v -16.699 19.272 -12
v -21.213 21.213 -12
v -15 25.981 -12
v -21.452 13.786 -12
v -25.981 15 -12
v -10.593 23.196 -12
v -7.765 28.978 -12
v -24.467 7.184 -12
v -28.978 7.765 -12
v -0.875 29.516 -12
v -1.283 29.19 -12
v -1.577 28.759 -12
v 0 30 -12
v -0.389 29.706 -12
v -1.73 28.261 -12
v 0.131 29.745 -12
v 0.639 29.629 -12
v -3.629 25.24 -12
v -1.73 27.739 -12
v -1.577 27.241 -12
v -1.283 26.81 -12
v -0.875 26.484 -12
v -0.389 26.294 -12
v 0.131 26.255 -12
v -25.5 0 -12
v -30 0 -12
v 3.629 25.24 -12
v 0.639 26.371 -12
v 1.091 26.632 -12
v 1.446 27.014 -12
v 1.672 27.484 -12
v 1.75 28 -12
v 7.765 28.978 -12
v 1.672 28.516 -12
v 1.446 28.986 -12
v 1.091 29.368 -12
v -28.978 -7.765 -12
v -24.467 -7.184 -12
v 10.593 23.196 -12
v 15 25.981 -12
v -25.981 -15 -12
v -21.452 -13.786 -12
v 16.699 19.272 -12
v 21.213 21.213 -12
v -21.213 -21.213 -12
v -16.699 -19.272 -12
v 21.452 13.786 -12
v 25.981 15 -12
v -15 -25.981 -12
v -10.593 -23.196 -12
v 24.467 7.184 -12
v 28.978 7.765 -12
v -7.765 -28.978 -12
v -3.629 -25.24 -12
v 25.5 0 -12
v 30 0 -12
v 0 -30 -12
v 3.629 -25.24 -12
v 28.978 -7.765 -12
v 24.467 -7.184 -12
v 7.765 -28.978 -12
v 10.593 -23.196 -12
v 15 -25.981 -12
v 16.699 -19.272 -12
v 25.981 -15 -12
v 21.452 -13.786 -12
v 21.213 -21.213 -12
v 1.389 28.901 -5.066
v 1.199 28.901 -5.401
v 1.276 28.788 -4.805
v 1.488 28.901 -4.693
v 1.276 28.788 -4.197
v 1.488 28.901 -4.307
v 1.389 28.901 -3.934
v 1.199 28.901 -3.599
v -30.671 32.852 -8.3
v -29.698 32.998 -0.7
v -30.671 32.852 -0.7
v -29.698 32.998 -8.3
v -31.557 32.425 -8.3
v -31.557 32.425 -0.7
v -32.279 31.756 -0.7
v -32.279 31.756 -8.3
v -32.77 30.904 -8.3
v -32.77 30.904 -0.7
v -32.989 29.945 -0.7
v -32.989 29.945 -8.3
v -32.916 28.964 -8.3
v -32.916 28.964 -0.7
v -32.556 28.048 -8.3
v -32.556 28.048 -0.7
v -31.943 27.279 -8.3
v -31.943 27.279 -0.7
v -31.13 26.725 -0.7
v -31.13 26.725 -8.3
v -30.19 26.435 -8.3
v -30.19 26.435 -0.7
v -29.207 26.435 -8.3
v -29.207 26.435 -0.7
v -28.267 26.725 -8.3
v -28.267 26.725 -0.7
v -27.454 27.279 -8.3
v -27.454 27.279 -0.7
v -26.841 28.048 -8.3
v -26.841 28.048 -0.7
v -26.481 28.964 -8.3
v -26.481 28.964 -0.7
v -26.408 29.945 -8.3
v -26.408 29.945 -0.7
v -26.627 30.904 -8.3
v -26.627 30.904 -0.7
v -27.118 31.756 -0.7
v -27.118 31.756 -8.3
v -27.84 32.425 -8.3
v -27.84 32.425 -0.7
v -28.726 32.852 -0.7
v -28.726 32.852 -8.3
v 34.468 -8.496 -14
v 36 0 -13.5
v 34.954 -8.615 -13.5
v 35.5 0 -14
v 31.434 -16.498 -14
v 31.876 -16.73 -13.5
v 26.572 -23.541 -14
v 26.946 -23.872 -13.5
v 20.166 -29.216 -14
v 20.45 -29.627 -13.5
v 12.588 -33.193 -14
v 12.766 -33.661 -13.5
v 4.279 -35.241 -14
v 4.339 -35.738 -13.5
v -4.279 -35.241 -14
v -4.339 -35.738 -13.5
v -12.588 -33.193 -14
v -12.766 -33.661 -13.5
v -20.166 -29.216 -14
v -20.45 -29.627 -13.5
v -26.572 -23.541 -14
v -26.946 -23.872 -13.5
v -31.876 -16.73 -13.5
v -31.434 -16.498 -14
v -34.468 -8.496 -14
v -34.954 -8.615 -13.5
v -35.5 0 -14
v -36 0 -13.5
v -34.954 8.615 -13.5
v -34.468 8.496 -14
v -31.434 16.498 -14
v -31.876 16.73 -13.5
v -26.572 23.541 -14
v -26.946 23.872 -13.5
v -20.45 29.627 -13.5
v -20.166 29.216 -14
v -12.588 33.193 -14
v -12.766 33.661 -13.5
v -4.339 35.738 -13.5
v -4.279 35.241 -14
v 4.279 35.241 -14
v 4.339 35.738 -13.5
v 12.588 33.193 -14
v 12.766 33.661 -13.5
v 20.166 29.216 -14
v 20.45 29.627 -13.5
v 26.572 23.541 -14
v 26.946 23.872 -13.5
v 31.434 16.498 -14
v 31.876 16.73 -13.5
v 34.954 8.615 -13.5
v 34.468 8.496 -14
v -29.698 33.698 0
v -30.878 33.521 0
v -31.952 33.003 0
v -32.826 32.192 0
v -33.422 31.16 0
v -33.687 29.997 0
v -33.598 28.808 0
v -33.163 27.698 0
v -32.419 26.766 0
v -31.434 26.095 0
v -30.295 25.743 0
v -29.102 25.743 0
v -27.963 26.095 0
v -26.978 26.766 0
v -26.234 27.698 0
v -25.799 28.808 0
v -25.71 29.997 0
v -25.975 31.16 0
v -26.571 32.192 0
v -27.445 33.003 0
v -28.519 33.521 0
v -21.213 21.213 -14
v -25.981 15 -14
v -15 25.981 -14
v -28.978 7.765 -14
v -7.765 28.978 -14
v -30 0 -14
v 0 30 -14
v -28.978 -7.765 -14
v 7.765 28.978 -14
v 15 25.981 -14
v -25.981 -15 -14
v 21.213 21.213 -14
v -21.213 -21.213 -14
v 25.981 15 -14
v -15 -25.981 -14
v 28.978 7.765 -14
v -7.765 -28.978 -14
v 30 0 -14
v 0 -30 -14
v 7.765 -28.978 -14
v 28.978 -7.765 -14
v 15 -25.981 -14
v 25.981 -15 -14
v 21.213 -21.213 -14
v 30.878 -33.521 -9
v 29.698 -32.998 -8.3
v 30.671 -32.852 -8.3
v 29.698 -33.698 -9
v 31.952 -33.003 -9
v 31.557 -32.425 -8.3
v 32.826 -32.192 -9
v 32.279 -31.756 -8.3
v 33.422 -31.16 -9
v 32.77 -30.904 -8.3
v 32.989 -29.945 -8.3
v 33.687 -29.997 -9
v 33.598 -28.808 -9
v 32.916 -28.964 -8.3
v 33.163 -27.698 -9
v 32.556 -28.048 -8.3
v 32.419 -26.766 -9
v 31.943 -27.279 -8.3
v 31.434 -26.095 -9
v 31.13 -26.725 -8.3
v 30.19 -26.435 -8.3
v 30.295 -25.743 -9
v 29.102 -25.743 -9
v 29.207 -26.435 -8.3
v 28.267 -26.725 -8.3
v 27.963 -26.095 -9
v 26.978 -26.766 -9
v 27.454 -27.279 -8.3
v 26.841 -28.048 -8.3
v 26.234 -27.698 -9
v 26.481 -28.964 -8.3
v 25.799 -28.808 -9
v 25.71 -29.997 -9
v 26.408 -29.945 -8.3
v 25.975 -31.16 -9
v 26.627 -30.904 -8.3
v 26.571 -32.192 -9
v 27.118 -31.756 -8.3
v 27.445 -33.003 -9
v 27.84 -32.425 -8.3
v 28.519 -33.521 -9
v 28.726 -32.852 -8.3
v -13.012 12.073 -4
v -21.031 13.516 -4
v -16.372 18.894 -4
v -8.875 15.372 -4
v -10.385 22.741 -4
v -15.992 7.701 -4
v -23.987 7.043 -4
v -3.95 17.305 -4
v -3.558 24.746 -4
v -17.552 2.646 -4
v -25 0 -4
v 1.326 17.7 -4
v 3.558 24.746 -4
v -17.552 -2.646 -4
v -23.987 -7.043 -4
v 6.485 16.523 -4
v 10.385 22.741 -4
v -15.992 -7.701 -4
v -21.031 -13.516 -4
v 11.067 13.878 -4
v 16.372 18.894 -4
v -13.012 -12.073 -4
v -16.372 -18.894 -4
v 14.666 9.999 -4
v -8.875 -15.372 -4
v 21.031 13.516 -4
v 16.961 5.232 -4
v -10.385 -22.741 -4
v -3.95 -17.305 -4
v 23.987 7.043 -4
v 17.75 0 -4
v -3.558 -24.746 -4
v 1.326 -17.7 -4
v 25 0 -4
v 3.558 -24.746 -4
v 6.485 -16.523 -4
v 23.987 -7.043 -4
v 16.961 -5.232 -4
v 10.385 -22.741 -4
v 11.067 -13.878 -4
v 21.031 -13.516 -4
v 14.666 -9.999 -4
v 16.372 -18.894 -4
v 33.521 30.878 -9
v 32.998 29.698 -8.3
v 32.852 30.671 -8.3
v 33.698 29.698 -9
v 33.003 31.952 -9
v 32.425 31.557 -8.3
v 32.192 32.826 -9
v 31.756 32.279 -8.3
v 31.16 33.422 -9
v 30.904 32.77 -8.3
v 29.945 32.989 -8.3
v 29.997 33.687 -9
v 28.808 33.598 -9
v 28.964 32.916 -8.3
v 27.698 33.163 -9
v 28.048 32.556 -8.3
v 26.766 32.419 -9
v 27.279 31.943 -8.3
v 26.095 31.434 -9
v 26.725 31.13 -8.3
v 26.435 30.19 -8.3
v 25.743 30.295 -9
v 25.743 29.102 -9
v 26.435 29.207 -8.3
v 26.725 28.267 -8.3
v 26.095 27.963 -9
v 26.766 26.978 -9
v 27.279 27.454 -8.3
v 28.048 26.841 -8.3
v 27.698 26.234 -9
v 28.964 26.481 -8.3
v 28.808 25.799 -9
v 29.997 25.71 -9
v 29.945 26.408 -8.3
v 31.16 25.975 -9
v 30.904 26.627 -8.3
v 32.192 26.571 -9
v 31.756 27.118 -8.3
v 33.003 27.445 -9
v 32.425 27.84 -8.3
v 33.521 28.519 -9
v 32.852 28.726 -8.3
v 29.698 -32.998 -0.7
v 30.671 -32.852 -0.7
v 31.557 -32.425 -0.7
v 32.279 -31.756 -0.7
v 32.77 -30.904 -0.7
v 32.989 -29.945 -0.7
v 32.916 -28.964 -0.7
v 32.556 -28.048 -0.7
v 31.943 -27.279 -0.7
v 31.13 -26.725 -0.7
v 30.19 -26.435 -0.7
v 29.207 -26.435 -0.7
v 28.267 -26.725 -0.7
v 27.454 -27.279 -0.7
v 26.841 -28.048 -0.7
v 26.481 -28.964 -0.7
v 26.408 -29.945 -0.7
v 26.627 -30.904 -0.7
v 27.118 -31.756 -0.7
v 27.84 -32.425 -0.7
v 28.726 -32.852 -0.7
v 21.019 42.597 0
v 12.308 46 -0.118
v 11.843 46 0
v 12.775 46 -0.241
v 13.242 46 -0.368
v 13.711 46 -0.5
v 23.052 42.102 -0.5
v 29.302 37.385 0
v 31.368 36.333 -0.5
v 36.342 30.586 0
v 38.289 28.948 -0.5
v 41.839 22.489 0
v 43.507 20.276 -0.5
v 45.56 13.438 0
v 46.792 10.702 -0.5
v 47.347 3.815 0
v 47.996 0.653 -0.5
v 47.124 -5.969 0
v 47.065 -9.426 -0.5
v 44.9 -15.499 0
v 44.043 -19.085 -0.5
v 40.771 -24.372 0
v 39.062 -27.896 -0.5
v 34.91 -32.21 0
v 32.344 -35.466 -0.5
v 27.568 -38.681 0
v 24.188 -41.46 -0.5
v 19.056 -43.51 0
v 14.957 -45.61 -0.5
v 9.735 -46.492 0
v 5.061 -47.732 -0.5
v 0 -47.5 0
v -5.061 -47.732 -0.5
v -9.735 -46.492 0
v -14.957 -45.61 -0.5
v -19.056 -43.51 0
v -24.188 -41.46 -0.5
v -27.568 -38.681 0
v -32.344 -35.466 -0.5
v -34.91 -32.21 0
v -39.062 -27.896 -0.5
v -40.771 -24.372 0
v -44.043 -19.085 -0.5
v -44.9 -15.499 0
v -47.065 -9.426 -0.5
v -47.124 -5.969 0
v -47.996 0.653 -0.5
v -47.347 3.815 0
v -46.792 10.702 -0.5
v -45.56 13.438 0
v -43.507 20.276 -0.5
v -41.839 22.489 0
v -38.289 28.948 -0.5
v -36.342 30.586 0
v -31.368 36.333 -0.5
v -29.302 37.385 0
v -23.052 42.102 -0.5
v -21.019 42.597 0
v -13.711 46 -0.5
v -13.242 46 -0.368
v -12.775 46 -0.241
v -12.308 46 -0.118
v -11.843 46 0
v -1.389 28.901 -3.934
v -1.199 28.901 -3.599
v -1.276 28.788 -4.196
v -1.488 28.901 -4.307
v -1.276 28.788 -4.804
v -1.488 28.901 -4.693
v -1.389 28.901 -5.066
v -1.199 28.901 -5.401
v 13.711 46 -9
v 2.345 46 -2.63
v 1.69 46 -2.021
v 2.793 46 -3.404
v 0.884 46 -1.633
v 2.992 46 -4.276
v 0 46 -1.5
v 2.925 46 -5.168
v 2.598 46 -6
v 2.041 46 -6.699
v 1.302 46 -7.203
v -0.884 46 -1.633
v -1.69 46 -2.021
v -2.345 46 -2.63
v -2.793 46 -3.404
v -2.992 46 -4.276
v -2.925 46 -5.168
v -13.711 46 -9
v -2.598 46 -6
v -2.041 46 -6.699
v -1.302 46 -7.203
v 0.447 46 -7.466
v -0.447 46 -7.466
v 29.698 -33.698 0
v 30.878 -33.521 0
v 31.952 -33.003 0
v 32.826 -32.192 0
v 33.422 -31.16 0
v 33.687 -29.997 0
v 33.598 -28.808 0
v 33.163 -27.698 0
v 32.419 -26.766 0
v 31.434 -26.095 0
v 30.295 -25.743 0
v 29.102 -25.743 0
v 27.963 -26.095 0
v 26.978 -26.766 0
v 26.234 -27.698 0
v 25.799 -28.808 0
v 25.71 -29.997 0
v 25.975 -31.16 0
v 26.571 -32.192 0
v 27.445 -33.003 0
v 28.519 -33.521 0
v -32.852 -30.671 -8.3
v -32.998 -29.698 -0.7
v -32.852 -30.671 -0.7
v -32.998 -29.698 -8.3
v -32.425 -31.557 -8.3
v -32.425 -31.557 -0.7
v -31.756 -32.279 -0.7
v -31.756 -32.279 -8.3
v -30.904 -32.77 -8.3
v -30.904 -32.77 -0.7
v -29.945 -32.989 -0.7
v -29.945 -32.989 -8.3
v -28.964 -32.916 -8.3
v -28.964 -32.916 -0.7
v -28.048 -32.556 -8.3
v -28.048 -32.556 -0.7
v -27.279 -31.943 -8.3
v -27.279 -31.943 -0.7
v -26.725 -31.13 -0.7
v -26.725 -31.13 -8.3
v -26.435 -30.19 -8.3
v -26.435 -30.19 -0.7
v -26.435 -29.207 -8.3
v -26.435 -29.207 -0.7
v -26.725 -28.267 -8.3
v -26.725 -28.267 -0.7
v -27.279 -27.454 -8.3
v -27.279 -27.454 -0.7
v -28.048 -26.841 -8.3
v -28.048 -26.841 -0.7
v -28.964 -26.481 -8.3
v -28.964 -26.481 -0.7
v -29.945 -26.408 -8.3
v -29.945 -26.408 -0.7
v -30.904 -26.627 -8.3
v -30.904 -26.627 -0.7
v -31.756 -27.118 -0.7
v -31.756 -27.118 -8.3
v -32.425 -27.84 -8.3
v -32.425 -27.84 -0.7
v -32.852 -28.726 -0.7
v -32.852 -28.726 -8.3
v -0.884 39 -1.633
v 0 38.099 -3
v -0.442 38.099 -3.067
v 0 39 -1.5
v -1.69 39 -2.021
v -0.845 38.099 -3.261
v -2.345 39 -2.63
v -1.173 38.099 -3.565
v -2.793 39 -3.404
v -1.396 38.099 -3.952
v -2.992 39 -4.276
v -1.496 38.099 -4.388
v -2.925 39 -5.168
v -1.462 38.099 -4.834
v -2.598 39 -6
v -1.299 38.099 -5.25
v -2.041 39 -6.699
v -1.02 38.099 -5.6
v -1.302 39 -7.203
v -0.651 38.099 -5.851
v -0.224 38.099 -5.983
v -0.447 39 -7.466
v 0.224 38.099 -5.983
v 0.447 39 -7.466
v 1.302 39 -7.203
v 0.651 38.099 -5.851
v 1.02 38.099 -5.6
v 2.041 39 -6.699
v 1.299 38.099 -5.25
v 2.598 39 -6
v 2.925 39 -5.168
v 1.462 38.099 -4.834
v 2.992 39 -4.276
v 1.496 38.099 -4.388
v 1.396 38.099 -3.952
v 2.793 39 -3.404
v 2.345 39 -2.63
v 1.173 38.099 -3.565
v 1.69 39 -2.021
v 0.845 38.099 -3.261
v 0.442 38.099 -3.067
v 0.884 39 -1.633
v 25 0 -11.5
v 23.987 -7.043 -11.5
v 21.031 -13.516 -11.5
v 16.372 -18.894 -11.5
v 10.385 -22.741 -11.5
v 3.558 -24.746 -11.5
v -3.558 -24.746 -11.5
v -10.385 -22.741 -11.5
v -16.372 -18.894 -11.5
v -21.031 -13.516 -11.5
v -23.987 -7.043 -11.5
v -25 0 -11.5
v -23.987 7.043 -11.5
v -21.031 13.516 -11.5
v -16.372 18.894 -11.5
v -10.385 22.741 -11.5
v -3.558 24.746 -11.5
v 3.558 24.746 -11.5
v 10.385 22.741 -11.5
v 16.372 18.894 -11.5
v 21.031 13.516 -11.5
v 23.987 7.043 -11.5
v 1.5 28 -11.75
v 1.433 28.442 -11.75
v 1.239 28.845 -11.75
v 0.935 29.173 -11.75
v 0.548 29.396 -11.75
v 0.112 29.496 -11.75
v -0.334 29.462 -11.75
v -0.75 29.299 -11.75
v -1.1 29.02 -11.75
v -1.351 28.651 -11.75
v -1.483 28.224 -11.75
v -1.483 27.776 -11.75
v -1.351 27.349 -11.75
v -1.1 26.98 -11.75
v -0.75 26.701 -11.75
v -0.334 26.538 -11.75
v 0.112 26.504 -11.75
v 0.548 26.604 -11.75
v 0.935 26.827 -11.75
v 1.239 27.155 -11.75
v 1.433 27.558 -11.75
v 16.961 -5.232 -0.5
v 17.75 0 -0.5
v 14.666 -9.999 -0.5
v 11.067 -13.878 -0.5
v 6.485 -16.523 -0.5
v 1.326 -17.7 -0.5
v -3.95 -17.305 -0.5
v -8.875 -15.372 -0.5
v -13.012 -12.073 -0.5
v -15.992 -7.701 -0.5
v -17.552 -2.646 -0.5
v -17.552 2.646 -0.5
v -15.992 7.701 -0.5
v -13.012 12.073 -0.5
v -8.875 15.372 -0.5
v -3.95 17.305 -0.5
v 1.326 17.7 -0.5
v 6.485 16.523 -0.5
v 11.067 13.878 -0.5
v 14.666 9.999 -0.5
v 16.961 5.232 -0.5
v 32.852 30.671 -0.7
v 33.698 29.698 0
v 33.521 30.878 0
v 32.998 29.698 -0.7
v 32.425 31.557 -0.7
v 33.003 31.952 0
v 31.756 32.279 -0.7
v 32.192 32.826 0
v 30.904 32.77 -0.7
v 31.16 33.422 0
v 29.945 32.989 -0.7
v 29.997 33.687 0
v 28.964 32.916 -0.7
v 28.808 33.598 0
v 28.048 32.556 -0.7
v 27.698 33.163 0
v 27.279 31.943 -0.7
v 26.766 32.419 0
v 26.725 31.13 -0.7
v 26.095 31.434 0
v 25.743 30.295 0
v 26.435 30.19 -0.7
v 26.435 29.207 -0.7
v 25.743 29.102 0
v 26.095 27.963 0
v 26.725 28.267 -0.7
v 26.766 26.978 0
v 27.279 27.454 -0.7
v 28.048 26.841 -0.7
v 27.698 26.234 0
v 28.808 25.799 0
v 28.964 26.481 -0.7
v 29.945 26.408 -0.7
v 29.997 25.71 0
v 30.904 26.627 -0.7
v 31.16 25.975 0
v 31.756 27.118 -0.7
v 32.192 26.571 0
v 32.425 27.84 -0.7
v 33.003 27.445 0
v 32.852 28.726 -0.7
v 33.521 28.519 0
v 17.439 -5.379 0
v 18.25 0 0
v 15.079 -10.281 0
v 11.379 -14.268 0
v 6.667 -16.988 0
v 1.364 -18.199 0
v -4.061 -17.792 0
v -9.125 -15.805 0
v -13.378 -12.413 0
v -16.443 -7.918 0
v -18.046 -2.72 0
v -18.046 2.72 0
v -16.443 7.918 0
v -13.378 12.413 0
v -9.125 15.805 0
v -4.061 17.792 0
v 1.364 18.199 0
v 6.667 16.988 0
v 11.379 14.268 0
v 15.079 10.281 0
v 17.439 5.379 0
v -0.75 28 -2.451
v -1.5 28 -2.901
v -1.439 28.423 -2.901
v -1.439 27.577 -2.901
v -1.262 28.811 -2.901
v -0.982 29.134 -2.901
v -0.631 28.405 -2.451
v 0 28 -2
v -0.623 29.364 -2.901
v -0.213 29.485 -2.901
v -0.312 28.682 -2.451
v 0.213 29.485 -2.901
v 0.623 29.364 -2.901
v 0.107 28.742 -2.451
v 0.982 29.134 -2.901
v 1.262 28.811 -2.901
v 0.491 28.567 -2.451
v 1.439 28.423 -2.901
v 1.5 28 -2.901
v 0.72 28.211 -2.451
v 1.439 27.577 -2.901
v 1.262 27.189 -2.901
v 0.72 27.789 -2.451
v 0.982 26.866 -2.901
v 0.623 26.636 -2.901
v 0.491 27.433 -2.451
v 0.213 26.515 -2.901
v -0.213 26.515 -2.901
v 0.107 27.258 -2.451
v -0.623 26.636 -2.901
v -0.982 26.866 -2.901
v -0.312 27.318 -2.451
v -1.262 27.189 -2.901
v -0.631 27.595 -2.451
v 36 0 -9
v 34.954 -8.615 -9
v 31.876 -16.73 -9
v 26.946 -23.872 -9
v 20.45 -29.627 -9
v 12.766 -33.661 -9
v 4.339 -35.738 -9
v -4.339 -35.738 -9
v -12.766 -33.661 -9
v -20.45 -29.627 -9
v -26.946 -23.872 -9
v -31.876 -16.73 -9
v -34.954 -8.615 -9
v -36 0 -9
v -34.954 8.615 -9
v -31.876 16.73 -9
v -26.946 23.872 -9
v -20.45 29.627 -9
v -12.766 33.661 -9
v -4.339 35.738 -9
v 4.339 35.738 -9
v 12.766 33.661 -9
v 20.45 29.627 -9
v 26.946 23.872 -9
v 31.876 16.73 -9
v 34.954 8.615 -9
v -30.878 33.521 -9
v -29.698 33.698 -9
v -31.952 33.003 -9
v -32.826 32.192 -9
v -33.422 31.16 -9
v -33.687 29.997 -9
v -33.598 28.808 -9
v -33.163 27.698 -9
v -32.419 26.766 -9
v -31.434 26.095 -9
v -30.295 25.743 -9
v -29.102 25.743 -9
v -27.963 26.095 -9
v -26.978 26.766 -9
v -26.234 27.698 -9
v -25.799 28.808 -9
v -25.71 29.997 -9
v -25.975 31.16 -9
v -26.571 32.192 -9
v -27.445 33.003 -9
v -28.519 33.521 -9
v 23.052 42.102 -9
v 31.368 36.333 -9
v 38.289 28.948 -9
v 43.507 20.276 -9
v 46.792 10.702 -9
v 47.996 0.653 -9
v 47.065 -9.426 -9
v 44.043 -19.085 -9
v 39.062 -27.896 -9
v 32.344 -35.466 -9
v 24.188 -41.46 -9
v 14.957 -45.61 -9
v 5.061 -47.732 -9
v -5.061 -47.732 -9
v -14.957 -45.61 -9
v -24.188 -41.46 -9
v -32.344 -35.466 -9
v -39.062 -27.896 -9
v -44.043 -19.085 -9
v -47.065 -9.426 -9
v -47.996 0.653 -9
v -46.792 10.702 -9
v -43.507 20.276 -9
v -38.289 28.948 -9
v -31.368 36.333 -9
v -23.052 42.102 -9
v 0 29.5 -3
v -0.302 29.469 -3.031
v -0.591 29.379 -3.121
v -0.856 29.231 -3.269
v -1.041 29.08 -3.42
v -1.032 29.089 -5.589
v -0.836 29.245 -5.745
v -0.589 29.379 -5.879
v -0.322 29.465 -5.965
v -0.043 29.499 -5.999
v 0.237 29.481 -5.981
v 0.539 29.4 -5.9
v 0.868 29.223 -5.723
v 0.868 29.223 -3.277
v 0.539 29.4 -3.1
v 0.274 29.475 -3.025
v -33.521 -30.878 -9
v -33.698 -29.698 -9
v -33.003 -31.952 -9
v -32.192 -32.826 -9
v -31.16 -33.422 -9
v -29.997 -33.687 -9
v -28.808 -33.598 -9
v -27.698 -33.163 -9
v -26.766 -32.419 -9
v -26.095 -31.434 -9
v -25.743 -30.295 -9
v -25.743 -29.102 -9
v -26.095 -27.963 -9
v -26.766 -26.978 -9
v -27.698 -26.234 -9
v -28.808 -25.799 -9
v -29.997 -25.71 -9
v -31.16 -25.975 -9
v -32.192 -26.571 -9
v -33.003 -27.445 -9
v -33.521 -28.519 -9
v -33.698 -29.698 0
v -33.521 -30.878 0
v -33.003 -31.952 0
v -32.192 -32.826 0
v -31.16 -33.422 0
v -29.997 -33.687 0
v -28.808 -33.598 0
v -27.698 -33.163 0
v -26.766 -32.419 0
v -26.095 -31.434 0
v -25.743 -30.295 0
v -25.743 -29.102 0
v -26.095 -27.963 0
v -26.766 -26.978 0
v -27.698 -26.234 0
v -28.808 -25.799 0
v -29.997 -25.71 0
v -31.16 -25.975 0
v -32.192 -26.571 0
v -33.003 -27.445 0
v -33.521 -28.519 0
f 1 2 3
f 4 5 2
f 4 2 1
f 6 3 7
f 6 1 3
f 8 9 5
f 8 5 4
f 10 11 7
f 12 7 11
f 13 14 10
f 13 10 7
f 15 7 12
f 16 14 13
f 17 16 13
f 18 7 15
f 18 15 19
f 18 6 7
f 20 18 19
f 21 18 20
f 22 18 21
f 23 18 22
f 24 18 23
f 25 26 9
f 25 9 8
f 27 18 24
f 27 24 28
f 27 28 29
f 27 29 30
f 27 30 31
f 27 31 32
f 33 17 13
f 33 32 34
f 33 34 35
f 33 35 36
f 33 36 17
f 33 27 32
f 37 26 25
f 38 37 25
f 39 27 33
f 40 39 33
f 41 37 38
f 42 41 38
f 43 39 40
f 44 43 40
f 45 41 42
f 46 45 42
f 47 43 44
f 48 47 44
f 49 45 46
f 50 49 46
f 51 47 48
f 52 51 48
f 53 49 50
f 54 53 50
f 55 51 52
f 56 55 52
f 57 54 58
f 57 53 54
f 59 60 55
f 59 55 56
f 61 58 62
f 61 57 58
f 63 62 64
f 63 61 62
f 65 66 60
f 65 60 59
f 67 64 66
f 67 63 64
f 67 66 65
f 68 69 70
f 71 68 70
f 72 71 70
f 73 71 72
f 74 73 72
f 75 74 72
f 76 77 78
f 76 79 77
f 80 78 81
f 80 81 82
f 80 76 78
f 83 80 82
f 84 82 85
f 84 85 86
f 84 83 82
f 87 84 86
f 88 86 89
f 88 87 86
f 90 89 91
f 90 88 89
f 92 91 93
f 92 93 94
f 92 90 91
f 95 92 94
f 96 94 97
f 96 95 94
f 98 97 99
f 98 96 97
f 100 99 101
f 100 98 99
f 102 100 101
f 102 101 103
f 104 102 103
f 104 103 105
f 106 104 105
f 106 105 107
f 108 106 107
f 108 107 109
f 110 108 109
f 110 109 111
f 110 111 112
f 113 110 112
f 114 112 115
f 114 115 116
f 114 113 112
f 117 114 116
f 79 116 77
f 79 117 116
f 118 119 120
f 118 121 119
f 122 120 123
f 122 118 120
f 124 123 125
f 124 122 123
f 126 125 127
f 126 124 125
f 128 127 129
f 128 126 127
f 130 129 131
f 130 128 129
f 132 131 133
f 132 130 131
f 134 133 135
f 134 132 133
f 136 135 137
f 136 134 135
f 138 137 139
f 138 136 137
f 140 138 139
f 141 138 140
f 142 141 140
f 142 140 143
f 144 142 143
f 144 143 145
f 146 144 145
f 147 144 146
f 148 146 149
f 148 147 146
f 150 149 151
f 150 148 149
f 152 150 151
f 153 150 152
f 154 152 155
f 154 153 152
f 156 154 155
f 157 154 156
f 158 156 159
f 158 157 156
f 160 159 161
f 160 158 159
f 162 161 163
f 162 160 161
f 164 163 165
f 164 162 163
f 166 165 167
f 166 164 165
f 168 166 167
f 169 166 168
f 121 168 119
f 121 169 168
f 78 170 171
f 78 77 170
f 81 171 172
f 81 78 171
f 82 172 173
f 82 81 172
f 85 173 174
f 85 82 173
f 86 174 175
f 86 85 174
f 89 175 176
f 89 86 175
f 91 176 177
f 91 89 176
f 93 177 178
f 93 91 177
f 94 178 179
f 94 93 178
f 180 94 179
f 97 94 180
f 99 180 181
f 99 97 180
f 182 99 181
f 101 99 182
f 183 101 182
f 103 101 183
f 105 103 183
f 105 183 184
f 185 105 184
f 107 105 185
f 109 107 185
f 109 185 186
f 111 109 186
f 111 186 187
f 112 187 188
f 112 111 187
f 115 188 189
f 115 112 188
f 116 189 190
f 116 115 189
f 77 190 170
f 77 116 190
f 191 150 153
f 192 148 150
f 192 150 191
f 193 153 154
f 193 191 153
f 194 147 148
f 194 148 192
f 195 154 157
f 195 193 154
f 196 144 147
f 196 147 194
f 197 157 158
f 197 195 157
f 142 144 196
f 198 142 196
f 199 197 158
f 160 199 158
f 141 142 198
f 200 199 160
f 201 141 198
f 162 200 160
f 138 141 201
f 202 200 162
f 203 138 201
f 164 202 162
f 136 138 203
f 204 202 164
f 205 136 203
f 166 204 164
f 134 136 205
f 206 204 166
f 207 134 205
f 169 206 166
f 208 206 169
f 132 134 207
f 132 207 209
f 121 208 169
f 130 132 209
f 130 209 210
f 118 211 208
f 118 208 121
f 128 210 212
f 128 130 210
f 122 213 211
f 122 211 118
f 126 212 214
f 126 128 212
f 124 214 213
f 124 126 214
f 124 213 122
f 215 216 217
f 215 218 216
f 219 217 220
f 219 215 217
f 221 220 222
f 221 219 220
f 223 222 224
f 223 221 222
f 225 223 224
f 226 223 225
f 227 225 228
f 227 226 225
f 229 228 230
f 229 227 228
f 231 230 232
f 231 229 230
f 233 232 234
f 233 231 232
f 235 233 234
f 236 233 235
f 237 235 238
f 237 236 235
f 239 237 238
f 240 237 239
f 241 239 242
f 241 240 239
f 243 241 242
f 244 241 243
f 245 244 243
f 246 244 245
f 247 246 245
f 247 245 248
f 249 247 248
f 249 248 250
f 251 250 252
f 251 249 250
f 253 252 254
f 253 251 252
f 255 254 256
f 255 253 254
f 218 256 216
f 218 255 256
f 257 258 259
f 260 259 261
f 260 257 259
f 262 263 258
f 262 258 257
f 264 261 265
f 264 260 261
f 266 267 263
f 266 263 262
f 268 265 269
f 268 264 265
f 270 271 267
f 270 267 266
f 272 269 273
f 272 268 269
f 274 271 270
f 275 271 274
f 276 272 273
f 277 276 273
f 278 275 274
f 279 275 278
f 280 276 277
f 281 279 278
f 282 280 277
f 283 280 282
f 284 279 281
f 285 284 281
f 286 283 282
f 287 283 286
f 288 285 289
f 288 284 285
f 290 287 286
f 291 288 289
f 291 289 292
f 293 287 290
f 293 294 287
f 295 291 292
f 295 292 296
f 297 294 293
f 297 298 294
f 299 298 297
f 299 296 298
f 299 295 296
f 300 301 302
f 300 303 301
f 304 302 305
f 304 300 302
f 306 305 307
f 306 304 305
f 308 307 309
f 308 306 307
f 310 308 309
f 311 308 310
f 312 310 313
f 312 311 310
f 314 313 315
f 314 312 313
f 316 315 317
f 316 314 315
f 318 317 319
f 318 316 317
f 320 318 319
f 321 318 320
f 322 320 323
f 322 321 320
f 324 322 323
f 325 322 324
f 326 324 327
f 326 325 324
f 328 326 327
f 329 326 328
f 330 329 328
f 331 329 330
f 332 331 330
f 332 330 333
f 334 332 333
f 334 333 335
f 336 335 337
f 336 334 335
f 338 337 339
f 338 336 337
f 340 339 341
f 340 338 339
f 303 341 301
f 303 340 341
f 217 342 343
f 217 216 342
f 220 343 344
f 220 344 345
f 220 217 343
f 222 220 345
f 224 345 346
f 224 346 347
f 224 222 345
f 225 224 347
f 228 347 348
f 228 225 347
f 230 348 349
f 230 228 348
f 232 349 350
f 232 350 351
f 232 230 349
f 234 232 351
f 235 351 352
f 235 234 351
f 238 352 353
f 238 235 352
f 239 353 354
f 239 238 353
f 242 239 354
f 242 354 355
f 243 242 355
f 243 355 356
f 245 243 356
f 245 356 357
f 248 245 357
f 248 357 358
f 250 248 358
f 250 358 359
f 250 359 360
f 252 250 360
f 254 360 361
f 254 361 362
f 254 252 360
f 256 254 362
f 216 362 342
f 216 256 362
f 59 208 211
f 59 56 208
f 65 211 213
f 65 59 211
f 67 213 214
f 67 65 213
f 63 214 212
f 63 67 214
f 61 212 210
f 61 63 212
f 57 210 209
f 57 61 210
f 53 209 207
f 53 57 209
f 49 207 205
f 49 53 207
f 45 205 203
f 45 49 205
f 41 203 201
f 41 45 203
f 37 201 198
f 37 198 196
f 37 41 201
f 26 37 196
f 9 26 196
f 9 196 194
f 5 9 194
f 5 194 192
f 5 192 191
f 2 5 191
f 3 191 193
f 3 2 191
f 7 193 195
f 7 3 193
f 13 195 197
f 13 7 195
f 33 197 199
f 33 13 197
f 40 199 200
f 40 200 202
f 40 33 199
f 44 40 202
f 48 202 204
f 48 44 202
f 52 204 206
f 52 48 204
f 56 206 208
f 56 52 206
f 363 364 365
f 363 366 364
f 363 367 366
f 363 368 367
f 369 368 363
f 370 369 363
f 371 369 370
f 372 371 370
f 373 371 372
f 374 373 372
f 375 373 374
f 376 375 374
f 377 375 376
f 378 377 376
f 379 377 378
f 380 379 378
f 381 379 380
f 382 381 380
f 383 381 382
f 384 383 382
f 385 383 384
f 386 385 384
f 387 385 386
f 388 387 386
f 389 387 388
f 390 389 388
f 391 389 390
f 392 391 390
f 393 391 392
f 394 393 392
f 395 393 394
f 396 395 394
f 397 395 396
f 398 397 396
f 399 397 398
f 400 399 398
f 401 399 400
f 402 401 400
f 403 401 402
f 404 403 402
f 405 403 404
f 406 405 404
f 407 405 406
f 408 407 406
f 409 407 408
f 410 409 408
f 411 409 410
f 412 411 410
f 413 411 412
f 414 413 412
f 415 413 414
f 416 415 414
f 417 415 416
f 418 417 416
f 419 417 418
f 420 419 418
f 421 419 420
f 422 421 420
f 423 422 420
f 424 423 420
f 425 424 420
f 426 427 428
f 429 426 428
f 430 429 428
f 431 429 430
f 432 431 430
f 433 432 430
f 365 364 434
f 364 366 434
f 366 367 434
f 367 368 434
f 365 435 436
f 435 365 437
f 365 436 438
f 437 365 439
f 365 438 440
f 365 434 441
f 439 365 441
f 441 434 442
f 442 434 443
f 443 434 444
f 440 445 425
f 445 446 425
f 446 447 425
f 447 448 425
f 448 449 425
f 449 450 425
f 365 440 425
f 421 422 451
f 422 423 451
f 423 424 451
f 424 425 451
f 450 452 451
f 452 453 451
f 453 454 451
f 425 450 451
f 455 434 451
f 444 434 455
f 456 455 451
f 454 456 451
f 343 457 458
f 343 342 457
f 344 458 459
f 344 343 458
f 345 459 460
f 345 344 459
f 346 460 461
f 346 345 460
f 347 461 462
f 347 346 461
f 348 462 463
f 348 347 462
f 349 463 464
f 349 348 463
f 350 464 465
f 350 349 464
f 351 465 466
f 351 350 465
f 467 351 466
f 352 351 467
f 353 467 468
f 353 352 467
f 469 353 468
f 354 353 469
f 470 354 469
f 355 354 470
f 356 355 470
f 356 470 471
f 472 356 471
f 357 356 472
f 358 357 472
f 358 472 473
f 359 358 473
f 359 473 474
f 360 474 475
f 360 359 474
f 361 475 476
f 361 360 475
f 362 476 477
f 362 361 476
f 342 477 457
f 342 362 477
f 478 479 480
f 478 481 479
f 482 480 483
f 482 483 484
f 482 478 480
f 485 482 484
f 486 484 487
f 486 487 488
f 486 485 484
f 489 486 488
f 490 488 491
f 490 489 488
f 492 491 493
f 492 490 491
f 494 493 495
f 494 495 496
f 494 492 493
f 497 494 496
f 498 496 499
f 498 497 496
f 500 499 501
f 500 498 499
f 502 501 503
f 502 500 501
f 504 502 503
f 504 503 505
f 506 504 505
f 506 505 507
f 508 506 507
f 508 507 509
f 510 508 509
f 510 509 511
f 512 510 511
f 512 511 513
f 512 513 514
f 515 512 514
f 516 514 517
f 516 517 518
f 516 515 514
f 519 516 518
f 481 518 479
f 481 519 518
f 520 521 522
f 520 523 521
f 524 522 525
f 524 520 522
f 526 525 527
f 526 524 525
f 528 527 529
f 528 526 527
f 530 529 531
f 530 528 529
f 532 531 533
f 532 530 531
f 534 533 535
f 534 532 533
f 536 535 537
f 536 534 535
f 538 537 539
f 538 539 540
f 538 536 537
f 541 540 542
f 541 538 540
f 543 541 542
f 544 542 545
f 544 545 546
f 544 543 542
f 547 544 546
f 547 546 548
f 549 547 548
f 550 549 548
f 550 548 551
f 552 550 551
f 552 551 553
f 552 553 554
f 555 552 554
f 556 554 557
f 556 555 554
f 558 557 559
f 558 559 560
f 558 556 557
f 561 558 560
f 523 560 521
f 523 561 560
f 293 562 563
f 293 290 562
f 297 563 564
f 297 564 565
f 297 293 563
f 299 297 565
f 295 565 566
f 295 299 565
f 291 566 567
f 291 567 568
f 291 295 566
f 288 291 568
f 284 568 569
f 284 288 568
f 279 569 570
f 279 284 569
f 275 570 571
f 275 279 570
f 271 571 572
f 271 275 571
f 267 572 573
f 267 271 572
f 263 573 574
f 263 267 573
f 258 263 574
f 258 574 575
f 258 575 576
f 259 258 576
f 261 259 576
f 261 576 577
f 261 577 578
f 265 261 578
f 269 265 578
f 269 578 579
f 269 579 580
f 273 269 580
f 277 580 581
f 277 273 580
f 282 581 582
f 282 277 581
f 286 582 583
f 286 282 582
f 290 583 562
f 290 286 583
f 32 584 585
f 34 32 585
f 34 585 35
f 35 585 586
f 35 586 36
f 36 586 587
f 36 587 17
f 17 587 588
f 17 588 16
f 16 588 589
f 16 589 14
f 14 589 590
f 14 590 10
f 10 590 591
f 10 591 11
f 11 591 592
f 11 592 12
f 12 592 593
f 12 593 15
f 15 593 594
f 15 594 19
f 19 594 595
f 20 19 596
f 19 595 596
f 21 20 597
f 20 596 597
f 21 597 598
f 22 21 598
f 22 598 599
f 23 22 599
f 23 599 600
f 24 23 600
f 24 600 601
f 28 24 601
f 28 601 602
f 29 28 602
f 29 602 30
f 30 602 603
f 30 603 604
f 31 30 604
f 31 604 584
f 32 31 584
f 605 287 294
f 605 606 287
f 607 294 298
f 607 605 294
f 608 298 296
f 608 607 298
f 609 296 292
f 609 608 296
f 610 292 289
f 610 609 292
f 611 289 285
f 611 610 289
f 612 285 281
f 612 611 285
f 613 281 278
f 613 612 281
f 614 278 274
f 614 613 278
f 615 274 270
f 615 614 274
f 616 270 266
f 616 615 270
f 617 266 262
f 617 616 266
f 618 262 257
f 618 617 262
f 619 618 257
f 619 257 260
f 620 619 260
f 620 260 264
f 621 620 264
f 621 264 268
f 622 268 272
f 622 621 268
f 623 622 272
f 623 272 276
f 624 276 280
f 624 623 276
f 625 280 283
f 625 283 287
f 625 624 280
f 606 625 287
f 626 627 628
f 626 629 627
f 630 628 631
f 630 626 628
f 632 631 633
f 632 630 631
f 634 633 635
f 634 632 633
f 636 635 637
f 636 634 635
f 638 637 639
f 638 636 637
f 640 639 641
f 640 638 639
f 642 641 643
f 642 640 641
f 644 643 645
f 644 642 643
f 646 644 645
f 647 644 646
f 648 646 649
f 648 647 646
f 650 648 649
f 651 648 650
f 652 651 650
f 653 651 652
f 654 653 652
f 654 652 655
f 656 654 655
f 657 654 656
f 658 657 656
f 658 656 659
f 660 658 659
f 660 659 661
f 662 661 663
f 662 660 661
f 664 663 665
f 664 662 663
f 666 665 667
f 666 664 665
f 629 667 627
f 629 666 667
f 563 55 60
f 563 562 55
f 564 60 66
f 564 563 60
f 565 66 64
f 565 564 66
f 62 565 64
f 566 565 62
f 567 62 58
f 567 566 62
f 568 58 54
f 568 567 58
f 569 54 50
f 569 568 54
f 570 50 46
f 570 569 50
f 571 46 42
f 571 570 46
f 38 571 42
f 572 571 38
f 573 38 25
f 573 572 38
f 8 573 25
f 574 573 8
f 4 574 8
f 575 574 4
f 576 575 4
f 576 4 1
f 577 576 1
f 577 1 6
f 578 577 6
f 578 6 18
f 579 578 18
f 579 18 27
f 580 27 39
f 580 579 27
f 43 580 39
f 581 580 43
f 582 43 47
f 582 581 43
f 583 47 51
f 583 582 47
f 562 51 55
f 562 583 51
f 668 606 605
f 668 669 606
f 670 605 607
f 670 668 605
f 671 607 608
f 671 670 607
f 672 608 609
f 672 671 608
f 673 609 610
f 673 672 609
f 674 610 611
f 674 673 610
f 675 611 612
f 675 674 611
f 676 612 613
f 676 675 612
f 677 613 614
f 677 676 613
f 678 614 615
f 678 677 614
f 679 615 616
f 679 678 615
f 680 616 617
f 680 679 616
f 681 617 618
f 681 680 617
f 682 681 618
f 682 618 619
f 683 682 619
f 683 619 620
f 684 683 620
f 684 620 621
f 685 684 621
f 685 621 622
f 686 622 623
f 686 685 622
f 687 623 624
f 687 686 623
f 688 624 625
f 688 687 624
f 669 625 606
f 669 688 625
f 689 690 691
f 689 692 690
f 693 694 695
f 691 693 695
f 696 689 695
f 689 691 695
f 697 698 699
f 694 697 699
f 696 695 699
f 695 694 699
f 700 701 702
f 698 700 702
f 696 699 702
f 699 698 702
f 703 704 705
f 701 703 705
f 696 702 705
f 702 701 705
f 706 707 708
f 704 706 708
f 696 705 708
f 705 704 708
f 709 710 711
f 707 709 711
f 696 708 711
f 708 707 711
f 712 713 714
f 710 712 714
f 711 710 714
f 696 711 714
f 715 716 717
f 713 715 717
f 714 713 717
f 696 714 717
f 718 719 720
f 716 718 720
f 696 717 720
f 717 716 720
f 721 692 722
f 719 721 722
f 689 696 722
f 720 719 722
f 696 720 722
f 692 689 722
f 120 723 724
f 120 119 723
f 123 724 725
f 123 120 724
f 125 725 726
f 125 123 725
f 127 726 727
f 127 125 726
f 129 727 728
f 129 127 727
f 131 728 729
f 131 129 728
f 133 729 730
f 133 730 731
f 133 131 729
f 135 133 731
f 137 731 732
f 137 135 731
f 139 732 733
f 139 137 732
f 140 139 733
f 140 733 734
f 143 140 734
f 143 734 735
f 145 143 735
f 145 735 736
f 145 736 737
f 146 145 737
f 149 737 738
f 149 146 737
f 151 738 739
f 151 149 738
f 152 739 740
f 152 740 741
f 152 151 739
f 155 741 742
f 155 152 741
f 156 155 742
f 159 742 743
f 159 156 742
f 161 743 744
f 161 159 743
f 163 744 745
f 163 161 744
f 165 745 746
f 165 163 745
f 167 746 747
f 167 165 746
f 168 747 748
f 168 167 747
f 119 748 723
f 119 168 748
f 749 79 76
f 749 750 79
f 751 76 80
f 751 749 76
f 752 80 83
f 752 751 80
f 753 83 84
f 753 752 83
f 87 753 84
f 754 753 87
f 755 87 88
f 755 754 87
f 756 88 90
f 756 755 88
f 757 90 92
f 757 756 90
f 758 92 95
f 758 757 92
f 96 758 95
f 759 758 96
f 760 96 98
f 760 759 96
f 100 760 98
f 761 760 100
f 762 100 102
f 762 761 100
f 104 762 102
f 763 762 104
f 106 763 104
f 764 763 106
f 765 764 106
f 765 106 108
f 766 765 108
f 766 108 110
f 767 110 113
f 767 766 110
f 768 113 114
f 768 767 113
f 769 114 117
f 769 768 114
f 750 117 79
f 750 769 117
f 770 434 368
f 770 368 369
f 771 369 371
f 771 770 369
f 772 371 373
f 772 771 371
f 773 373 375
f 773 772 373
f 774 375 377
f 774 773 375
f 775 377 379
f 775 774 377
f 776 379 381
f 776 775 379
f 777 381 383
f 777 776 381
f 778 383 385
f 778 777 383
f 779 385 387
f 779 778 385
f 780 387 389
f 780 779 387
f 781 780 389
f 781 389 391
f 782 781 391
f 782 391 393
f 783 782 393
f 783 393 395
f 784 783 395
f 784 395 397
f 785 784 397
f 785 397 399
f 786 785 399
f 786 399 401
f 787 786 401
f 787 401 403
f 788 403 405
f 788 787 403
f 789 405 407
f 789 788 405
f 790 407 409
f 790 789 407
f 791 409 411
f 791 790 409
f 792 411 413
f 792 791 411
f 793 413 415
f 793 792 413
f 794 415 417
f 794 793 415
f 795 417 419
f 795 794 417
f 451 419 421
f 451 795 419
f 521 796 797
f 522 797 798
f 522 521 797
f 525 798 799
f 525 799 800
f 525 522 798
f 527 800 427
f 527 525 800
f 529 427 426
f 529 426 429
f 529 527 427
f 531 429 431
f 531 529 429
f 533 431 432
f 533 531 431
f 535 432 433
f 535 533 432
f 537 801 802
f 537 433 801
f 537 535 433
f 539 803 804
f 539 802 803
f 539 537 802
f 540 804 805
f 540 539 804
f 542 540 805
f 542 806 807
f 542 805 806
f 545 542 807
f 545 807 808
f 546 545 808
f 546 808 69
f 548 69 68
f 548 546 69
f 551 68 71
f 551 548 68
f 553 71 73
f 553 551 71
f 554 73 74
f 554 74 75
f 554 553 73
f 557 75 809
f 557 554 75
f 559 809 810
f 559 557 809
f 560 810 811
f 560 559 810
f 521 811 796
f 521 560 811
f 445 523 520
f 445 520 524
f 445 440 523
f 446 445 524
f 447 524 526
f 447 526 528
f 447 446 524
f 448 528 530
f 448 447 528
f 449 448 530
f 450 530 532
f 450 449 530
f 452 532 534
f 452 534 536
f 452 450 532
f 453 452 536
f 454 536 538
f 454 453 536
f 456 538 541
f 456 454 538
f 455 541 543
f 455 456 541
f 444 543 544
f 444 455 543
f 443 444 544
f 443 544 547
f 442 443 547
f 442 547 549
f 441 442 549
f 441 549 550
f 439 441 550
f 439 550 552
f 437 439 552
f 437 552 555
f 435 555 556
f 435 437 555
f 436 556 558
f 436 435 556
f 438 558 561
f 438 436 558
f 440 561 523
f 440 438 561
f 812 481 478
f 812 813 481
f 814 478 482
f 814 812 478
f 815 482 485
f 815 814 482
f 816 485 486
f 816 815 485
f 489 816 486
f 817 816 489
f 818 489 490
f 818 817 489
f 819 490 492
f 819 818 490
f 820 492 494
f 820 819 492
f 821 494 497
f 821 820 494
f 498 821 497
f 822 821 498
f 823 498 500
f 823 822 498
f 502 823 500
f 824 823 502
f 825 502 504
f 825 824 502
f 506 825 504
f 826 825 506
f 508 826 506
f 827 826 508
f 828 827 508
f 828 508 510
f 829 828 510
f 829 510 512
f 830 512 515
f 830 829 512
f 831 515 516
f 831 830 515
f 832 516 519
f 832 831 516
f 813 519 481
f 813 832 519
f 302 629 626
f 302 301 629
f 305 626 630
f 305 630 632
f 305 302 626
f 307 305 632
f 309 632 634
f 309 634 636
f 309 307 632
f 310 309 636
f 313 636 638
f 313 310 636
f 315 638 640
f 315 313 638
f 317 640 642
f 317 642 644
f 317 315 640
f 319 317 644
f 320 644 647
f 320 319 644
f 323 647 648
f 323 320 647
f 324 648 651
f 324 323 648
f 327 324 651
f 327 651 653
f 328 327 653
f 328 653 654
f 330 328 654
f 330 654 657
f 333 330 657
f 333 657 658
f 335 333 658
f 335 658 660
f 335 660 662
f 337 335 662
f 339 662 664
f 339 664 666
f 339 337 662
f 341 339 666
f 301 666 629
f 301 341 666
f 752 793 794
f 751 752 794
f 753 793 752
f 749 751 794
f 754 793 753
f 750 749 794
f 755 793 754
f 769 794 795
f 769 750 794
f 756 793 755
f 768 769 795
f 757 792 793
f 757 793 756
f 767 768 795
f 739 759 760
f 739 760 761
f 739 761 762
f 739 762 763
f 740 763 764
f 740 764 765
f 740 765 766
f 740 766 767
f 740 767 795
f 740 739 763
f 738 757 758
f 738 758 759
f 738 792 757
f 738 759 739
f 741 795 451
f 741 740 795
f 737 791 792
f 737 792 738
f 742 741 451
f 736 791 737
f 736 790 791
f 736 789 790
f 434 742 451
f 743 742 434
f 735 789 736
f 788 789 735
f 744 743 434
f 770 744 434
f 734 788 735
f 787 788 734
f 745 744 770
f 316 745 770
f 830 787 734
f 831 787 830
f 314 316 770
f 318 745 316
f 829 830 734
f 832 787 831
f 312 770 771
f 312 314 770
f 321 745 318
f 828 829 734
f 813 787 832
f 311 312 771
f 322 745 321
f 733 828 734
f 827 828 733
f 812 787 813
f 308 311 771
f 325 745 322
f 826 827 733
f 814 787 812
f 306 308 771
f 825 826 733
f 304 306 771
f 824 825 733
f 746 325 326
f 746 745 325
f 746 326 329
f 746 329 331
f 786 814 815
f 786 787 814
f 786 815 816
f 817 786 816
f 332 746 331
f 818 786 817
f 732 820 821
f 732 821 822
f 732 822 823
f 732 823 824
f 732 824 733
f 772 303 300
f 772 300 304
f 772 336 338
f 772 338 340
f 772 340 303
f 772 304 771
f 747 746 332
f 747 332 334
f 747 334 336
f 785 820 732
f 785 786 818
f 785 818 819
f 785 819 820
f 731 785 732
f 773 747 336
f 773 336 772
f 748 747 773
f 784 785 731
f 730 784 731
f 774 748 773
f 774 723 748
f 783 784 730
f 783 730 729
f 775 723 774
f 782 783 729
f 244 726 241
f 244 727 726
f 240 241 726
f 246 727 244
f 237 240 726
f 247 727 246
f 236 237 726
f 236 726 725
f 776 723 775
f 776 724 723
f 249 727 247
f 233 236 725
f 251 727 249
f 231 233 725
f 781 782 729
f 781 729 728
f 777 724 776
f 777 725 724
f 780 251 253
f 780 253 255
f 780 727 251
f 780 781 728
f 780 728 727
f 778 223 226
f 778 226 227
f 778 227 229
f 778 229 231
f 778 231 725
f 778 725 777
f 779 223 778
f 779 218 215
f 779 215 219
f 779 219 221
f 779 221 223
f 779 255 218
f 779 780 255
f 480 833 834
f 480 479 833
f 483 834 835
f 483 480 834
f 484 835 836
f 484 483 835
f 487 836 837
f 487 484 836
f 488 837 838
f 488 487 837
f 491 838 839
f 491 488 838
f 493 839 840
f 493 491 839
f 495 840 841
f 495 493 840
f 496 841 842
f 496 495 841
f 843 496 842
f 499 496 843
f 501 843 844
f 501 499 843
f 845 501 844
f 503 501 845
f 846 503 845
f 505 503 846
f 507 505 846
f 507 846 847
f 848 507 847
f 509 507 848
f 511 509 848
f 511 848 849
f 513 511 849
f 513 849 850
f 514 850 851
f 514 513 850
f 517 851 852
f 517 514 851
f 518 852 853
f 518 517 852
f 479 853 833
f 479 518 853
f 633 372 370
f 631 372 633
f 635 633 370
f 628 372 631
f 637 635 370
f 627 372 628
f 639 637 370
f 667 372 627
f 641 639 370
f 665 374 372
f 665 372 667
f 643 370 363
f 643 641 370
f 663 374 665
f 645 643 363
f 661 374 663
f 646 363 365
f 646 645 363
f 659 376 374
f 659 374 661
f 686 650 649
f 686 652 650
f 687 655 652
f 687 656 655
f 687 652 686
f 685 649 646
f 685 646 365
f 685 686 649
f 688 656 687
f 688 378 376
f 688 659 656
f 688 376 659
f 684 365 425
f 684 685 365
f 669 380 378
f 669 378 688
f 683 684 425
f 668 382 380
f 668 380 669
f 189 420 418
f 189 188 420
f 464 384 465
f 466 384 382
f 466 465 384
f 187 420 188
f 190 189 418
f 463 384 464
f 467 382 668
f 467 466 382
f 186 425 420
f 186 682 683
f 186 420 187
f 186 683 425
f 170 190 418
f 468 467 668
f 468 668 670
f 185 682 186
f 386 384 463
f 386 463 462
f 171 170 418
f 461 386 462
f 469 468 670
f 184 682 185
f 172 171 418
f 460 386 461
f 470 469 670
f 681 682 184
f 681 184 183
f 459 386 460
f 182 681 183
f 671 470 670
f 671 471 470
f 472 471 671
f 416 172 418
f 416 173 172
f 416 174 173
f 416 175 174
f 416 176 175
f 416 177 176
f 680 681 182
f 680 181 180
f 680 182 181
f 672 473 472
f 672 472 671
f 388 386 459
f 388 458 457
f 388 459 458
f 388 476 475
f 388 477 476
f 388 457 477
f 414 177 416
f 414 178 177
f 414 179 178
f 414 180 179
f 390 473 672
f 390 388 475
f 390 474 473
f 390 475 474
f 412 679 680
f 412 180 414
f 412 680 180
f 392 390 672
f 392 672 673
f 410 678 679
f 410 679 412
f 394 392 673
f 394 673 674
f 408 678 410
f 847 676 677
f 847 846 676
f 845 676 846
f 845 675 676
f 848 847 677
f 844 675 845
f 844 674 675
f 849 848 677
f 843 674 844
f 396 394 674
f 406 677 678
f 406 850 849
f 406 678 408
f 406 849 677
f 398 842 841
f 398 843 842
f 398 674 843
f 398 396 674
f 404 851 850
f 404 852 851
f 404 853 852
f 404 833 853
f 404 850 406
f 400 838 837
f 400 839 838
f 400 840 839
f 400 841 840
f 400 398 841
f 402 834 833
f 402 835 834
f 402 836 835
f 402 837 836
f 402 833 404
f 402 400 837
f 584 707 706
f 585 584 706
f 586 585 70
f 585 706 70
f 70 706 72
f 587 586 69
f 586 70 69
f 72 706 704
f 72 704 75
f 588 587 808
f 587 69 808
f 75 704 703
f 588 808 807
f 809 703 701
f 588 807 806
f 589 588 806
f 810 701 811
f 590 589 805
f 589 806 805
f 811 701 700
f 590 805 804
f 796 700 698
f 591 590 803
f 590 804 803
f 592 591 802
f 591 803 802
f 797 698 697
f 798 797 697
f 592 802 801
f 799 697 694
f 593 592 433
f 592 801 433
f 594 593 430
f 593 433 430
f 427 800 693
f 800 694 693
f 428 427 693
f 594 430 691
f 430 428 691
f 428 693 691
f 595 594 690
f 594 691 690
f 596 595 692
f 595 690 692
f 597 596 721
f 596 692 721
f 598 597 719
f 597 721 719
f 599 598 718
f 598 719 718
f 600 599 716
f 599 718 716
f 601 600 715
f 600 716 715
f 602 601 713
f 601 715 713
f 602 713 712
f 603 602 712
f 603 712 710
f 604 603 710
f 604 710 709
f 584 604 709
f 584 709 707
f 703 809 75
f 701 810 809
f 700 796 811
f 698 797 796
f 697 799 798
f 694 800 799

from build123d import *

# Parameters (mm, degrees)
CIRPATTERN1_COUNT               = 4
SKETCH4_W                       = 93.853238467
SKETCH4_H                       = 20.664933241
CUT_EXTRUDE1_DEPTH              = 69.476273263
F_3_0MM_DOWEL_HOLE1_D           = 3
F_3_0MM_DOWEL_HOLE1_DEPTH       = 9.098709071
F_3_0MM_DOWEL_HOLE1_CSINK_D     = 3.5
F_3_0MM_DOWEL_HOLE1_CSINK_ANGLE = 90
F_3_0MM_DOWEL_HOLE1_TIP         = 0.901290929


with BuildPart() as part:
    # Sketch1 → Revolve1 (revolve)
    with BuildSketch(Plane(origin=(0, 0, 0), x_dir=(0, 0, -1), z_dir=(1, 0, 0)), mode=Mode.PRIVATE) as revolve1_sk:
        Polygon((0, -18.25), (0, -47.5), (0.5, -48), (9, -48), (9, -36), (13.5, -36), (14, -35.5), (14, -30), (12, -30), (12, -25.5), (11.5, -25), (4, -25), (4, -17.75), (0.5, -17.75), align=None)
    revolve(revolve1_sk.sketch.rotate(Axis((0, 0, 0), (0, 0, -1)), 270), axis=Axis((0, 0, 0), (0, 0, -1)))

    # Sketch3 → Ø6.0mm Dowel Hole1 (revolve, cut)
    with BuildSketch(Plane(origin=(-29.69848481, 29.69848481, -9), x_dir=(0, 1, 0), z_dir=(1, 0, 0))):
        Polygon((0, 0), (0, 9), (4, 9), (3.3, 8.3), (3.3, 0.7), (4, 0), align=None)
    f_6_0mm_dowel_hole1 = revolve(axis=Axis((-29.69848481, 29.69848481, -15.35), (0, 0, 1)), mode=Mode.SUBTRACT)

    # CirPattern1: Ø6.0mm Dowel Hole1 ×4 about axis
    cirpattern1_axis = Axis((0, 0, 0), (0, 0, 1))
    for i in range(1, CIRPATTERN1_COUNT):
        add(f_6_0mm_dowel_hole1.rotate(cirpattern1_axis, i * 360 / CIRPATTERN1_COUNT), mode=Mode.SUBTRACT)

    # Sketch4 → Cut-Extrude1 (cut, through all)
    with BuildSketch(Plane(origin=(0, 0, -9), x_dir=(-1, 0, 0), z_dir=(0, 0, -1))):
        with Locations((-0.198842092, 56.33246662)):
            Rectangle(SKETCH4_W, SKETCH4_H)
    extrude(amount=-CUT_EXTRUDE1_DEPTH, mode=Mode.SUBTRACT)

    # Ø3.0mm Dowel Hole1
    with Locations(Plane(origin=(0, 0, -12), x_dir=(-1, 0, 0), z_dir=(0, 0, -1))):
        with Locations((0, 28)):
            CounterSinkHole(F_3_0MM_DOWEL_HOLE1_D / 2, F_3_0MM_DOWEL_HOLE1_CSINK_D / 2, depth=F_3_0MM_DOWEL_HOLE1_DEPTH, counter_sink_angle=F_3_0MM_DOWEL_HOLE1_CSINK_ANGLE)
            with Locations((0, 0, -(F_3_0MM_DOWEL_HOLE1_DEPTH + F_3_0MM_DOWEL_HOLE1_TIP / 2))):  # 118° drill point
                Cone(0, F_3_0MM_DOWEL_HOLE1_D / 2, F_3_0MM_DOWEL_HOLE1_TIP, mode=Mode.SUBTRACT)

    # Sketch9 → Hole1 (revolve, cut)
    with BuildSketch(Plane(origin=(0, 46, -4.5), x_dir=(0, 0, 1), z_dir=(1, 0, 0))):
        Polygon((0, 0), (0, 18), (1.5, 17.098709071), (1.5, 7.901290929), (3, 7), (3, 0), align=None)
    revolve(axis=Axis((0, 52.130023899, -4.5), (0, -1, 0)), mode=Mode.SUBTRACT)


solid = part.part
